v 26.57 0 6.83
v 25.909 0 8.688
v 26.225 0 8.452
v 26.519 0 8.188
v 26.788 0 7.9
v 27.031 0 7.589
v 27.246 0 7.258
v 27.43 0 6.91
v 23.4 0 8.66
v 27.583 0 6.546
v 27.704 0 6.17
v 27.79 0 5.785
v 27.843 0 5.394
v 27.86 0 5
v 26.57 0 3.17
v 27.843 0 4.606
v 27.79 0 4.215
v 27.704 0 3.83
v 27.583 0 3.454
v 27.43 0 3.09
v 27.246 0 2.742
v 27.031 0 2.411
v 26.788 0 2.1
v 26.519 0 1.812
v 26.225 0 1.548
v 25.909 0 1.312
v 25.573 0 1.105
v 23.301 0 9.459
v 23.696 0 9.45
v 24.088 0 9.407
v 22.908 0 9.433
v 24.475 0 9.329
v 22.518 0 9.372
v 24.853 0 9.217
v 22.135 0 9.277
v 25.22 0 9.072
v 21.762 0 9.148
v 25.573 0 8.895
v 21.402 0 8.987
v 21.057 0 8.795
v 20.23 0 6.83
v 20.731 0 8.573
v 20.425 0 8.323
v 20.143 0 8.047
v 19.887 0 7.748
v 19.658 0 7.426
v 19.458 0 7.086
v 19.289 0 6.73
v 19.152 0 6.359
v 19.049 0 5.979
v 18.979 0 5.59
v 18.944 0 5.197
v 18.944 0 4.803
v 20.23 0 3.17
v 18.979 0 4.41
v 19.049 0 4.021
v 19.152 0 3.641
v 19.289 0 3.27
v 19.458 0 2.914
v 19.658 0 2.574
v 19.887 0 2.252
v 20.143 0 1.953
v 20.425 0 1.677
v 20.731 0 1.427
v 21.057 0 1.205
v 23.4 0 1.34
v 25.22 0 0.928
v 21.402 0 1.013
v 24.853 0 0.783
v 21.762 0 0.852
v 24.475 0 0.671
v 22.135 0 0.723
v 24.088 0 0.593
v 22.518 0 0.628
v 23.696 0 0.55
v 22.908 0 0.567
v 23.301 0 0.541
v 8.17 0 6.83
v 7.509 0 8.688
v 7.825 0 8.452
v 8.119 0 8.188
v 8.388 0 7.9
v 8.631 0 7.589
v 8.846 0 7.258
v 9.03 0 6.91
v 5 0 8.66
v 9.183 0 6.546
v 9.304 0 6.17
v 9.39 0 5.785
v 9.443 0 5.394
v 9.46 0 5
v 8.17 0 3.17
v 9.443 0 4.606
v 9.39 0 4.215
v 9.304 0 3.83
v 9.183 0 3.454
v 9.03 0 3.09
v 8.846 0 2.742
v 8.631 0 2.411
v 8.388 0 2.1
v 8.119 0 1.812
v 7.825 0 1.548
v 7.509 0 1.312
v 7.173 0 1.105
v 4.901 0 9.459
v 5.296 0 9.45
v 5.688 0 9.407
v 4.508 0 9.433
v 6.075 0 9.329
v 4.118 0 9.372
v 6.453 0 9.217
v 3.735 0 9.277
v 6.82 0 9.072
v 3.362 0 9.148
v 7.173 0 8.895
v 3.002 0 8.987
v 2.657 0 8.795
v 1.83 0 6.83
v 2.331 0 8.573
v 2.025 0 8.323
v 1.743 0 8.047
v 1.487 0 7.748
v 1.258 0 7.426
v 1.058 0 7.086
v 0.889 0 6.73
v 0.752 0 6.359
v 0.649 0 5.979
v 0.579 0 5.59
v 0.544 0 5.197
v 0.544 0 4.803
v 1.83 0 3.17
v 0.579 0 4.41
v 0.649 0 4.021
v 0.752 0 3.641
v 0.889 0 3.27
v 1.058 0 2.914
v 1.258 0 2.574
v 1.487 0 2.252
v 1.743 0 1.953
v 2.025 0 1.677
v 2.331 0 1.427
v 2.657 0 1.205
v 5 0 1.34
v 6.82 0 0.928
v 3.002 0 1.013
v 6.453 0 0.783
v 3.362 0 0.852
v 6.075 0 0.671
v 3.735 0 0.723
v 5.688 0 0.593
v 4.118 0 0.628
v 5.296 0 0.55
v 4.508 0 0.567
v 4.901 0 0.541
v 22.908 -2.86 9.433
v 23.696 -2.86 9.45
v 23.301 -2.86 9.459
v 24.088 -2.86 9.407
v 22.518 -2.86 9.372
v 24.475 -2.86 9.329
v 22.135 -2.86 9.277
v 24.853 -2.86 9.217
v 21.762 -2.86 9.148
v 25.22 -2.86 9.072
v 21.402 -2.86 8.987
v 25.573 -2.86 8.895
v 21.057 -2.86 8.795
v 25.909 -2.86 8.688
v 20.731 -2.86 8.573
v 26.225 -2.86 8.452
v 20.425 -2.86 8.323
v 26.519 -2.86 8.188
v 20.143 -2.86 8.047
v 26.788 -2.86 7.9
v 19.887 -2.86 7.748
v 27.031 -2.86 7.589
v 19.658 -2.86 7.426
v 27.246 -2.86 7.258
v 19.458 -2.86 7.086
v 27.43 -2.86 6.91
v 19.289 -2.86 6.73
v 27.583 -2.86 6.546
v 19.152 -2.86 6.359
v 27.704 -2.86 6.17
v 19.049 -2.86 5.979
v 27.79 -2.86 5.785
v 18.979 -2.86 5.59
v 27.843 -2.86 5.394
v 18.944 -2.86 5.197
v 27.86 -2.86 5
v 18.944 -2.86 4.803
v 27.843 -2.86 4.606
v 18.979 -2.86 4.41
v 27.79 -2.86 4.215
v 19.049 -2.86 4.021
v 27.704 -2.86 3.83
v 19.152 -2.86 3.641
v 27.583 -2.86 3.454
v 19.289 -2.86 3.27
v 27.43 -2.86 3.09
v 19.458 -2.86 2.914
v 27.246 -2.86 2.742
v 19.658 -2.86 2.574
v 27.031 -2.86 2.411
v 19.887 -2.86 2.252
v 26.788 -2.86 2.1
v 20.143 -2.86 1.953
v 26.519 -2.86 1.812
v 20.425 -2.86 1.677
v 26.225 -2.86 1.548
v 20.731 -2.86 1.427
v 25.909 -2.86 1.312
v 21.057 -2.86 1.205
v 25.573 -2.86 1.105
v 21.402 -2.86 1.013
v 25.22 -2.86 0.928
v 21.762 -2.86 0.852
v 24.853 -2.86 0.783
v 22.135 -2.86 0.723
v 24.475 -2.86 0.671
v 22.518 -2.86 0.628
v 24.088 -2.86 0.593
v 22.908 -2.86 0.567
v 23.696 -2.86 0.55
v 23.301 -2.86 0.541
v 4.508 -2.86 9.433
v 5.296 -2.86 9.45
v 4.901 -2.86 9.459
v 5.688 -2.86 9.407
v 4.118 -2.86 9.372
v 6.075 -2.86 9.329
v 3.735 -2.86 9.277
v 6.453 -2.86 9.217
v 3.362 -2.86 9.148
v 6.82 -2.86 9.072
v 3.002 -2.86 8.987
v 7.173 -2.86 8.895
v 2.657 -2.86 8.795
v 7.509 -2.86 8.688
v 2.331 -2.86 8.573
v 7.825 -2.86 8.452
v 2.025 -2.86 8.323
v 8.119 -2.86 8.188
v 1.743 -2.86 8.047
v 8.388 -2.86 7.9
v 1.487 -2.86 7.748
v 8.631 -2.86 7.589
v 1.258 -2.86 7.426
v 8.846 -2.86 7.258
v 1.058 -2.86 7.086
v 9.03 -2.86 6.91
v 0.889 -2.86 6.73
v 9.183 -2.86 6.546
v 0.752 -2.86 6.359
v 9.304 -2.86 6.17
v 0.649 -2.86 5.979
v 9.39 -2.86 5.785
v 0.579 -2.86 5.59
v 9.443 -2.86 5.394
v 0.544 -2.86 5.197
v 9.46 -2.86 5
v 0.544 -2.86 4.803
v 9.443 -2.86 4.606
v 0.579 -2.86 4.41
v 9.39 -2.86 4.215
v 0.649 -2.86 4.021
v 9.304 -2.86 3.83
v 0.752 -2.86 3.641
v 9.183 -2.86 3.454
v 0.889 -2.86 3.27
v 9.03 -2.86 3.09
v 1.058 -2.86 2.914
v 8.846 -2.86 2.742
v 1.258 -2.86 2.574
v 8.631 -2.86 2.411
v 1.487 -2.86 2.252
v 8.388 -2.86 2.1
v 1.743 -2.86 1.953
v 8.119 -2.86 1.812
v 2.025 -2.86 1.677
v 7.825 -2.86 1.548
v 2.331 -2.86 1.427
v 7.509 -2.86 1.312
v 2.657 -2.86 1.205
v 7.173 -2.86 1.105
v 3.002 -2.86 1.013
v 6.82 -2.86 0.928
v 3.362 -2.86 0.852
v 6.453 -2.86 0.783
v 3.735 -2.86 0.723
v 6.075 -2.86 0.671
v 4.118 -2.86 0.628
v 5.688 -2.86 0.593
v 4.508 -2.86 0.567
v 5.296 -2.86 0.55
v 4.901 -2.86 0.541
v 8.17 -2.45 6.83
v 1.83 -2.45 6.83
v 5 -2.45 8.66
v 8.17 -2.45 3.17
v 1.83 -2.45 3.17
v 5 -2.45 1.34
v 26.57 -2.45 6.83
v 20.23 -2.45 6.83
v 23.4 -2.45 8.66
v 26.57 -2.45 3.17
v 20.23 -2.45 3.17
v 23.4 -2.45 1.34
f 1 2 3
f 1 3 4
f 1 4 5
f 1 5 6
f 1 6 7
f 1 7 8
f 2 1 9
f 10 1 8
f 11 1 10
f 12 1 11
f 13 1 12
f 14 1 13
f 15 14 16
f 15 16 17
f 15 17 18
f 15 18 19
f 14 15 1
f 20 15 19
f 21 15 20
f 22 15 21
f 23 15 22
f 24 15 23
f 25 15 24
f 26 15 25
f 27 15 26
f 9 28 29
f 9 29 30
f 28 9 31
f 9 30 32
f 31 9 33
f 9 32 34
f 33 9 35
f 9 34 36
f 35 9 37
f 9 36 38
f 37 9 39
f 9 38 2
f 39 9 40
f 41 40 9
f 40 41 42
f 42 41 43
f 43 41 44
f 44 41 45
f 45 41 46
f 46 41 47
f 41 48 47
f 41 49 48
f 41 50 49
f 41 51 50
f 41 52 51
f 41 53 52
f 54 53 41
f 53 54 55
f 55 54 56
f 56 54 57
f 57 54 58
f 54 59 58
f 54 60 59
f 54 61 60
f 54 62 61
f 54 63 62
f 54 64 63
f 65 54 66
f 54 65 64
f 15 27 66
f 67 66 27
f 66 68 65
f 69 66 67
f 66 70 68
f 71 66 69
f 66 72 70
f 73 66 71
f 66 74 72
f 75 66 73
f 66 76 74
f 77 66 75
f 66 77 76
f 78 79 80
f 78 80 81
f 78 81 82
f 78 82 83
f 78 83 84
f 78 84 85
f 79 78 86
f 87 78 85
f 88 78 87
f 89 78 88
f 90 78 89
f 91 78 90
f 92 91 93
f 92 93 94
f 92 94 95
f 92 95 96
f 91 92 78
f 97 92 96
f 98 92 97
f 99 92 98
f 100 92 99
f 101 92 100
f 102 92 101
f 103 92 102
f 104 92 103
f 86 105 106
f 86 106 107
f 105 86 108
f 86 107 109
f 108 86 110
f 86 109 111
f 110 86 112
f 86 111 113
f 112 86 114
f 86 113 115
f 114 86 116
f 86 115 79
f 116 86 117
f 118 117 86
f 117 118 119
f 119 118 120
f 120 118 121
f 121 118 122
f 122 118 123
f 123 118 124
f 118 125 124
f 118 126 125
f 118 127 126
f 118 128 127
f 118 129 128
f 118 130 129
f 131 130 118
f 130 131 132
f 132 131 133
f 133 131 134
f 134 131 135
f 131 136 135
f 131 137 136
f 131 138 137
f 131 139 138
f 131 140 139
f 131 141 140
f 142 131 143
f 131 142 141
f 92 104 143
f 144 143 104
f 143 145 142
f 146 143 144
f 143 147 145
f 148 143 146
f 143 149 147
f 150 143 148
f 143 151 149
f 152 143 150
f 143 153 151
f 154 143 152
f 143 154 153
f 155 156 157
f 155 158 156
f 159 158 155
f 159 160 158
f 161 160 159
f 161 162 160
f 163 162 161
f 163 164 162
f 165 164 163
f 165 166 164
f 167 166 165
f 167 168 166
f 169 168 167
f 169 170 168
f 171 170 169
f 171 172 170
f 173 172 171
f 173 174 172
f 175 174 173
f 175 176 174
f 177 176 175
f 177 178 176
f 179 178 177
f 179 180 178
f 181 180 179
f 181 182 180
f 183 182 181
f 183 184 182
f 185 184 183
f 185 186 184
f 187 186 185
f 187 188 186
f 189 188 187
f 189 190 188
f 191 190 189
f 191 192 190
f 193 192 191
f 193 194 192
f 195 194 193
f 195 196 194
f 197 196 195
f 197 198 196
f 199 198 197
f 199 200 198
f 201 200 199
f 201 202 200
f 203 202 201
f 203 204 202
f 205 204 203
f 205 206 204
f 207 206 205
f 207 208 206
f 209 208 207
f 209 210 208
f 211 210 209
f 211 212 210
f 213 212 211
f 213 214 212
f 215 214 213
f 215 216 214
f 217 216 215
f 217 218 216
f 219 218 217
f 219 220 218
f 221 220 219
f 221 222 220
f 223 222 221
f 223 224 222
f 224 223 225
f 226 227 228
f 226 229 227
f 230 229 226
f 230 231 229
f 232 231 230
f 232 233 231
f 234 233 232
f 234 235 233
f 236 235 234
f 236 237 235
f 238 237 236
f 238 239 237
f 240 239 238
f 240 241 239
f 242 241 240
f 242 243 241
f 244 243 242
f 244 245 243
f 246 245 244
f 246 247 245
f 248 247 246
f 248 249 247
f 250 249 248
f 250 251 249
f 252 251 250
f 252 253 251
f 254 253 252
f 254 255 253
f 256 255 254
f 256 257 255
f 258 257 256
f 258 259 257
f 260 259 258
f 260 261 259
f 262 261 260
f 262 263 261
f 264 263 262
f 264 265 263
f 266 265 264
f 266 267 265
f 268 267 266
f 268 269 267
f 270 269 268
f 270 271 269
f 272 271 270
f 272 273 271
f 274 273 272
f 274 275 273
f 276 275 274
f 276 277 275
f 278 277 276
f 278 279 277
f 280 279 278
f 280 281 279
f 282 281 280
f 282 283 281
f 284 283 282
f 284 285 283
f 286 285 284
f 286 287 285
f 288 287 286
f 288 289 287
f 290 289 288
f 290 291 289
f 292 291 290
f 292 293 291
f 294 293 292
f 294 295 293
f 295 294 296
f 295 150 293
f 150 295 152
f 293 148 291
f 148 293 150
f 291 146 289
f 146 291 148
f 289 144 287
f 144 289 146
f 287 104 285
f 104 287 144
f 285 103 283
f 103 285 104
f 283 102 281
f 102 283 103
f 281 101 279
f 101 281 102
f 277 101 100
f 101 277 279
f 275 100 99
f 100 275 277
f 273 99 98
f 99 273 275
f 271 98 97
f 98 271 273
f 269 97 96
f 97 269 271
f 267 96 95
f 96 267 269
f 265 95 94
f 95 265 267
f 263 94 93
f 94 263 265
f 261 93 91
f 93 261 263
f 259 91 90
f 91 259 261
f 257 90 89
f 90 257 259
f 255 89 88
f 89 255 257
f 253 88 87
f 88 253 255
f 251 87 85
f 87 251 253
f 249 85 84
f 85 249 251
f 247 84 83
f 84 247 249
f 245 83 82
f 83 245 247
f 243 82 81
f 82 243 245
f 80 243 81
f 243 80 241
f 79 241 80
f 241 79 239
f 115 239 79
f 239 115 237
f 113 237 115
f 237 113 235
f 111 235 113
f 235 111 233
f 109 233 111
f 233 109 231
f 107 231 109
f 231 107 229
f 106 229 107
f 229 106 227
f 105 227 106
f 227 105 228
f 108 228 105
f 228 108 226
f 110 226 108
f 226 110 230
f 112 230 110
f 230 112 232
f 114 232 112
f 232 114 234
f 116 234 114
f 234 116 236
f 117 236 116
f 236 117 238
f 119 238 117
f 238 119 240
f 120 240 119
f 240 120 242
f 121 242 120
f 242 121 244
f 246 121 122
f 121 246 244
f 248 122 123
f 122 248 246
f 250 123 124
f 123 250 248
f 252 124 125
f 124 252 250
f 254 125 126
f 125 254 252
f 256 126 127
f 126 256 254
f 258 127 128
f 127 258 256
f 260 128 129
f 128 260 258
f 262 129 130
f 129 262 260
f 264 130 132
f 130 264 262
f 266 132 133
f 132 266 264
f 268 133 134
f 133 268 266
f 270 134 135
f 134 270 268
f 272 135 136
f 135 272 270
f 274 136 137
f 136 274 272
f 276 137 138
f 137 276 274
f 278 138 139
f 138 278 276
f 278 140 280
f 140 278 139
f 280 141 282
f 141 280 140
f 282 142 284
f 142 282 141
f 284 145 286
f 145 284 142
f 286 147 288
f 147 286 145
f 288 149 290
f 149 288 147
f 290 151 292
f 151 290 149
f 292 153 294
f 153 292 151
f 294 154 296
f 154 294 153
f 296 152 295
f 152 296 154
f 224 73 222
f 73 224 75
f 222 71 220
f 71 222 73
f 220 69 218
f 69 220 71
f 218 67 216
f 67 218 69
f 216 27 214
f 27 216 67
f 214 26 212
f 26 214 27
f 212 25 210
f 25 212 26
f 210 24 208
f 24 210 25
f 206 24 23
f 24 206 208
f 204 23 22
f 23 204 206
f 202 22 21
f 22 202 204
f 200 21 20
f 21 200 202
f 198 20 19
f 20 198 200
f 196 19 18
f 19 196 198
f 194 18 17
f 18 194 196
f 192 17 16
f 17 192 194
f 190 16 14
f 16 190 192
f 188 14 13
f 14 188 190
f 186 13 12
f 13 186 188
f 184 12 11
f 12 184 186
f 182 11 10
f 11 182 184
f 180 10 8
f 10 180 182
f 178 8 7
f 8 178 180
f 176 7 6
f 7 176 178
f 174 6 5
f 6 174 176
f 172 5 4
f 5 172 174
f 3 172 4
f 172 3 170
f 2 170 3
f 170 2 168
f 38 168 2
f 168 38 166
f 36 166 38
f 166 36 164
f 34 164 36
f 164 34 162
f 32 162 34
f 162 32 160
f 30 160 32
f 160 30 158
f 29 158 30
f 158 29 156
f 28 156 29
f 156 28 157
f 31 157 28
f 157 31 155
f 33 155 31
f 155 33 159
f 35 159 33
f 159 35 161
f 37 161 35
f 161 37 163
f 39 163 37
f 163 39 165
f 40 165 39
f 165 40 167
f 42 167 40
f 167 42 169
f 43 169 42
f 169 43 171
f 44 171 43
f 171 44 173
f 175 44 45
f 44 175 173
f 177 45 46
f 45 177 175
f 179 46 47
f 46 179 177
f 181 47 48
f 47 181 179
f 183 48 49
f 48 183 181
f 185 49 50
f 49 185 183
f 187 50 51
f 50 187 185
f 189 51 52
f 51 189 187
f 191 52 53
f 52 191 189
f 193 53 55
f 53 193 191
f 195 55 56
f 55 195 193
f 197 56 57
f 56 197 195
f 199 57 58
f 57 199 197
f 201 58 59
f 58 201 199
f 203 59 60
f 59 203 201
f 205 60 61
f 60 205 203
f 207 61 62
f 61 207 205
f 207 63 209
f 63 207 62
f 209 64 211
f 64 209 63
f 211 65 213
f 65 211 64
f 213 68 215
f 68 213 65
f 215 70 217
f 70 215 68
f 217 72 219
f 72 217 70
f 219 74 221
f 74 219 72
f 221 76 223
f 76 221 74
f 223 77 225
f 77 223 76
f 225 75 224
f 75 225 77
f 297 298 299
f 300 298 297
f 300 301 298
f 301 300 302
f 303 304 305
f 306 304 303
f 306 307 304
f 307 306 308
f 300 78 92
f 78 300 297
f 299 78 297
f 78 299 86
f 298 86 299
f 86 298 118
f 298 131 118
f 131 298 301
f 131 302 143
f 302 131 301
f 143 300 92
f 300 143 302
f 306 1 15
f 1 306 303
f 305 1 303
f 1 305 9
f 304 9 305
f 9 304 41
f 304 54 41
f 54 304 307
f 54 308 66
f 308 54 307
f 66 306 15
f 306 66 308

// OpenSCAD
// Copyright (C) 2025 Arif K. Rafiq
// This program is free software: you can redistribute it and/or modify
// it under the terms of the GNU General Public License as published by
// the Free Software Foundation, either version 3 of the License, or
// (at your option) any later version.

// This program is distributed in the hope that it will be useful,
// but WITHOUT ANY WARRANTY; without even the implied warranty of
// MERCHANTABILITY or FITNESS FOR A PARTICULAR PURPOSE.  See the
// GNU General Public License for more details.

// You should have received a copy of the GNU General Public License
// along with this file.  If not, see <https://www.gnu.org/licenses/>,
// or write to: license@temperedoptimism.com



/* Fixed in example3.scad        Set limits in customizer */
/* [Thicknesses (x),(y),(z)] */
tFitGap = [0.16, 0.16, 0.16];   //[0.00:0.01:0.64] 
tWallMin = [0.40, 0.40, 0.16];  //[0.16:0.08:1.60] 
/* [Proportional (x):(Radius, (y):(i)ntensity] */
pHexSink = [3.5, 2.3];          //[0.10:0.02:20.00] 
/* [2D vectors (x), (y)] */
vTerminal0 = [5.0, 5.0];        //[0.00:0.10:100] 
vTerminal1 = [23.4, 5.0];       //[0.00:0.10:100] 
/* [Special] */
fa0 = 4.0;     //[1:1:60]  
fs0 = 0.4;     //[0.1:0.1:4.0]  
fx0 = 2;       //[1,2,3,4,5,6,7,8,9,10]
// * [Hidden] */ /* Does not show up */
tEps=0.01; 

/* Calucualted at run time. */
pHexSurround = [pHexSink.x + (tWallMin.x * 2) + tFitGap.x, pHexSink.y + tWallMin.y + tFitGap.y];

//30.00-35.00 Circles, Also look at the customizer!!
// Rotate
rotate([90,0,0]){
  difference(){

    linear_extrude(pHexSurround.y, convexity=fx0){ 
      translate(vTerminal0)  circle(pHexSurround.x, $fa=fa0, $fs=fs0); 
      translate(vTerminal1)  circle(pHexSurround.x, $fa=fa0, $fs=fs0 );
    }
                      
    translate([0,0, -tEps]) linear_extrude(pHexSink.y + tFitGap.y, convexity=fx0){
      translate(vTerminal0)  rotate([0,0,30]) circle(pHexSink.x + tFitGap.y, $fn=6);
      translate(vTerminal1)  rotate([0,0,30]) circle(pHexSink.x + tFitGap.y, $fn=6);
    }
  }
}
